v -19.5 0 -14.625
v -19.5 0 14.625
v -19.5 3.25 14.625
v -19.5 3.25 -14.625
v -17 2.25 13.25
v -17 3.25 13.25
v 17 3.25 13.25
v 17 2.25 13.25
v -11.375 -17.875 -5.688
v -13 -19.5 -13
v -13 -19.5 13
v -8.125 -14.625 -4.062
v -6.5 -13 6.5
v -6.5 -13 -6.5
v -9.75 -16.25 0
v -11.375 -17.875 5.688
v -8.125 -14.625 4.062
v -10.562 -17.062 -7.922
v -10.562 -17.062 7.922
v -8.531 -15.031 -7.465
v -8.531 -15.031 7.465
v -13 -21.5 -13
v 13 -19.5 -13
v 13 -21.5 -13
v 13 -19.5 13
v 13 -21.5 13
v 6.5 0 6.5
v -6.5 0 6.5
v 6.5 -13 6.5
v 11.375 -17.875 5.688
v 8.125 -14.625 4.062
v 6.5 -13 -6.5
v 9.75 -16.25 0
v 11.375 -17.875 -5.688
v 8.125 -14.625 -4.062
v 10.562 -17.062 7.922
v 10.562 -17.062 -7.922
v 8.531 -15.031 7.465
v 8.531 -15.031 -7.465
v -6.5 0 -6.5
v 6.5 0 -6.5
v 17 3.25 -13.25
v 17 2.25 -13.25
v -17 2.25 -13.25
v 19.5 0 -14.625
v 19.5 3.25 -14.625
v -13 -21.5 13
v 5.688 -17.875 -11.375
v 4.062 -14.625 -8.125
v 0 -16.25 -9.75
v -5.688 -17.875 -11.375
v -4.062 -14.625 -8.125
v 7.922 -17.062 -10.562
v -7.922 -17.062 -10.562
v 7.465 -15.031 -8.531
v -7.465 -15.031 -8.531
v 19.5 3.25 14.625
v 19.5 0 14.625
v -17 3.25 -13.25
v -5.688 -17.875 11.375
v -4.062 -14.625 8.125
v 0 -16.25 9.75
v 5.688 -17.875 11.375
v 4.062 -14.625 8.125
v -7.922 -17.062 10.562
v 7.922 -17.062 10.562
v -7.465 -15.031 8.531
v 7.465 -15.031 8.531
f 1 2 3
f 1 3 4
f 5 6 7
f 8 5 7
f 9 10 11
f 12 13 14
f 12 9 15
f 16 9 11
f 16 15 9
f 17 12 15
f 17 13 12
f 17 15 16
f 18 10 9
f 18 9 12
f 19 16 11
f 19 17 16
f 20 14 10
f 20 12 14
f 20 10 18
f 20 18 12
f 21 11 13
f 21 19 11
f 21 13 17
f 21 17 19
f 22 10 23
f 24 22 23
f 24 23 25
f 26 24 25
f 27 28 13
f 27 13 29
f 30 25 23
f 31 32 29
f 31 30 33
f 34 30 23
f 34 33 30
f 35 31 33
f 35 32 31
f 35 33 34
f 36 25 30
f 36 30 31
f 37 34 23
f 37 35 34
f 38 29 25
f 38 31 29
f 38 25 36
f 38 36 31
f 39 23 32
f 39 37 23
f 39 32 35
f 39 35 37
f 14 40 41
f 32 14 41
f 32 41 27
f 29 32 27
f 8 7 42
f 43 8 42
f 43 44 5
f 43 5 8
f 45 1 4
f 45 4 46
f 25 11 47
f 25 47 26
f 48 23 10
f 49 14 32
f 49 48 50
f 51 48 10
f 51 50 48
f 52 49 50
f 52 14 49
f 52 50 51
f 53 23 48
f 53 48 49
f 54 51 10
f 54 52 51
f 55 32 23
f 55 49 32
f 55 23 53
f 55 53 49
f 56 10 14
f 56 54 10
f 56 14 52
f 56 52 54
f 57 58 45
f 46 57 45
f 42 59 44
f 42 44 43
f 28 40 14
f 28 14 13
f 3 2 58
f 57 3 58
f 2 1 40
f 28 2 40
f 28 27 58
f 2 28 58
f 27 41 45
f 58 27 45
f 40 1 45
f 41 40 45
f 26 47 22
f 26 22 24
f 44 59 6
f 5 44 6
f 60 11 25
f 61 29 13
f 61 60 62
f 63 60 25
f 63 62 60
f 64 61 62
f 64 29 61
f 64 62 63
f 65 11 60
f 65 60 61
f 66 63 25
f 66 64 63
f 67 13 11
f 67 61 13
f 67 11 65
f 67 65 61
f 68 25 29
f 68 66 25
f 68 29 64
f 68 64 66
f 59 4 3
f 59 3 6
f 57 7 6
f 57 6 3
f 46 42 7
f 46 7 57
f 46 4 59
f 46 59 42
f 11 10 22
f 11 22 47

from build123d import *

# Parameters (mm, degrees)
SKETCH1_W           = 39
SKETCH1_H           = 29.25
BOSS_EXTRUDE1_DEPTH = 3.25
SKETCH3_W           = 13
SKETCH3_H           = 13
BOSS_EXTRUDE3_DEPTH = 13
SKETCH5_W           = 34
SKETCH5_H           = 24
CUT_EXTRUDE1_DEPTH  = 1
SKETCH6_W           = 26
SKETCH6_H           = 26
BOSS_EXTRUDE4_DEPTH = 2
SKETCH8_W           = 34
SKETCH8_H           = 1.25
CUT_EXTRUDE2_DEPTH  = 1


with BuildPart() as part:
    # Sketch1 → Boss-Extrude1 (new body)
    with BuildSketch(Plane(origin=(0, 0, 0), x_dir=(1, 0, 0), z_dir=(0, 1, 0))):
        Rectangle(SKETCH1_W, SKETCH1_H)
    extrude(amount=BOSS_EXTRUDE1_DEPTH)

    # Sketch3 → Boss-Extrude3 (add)
    with BuildSketch(Plane.XZ):
        Rectangle(SKETCH3_W, SKETCH3_H)
    extrude(amount=BOSS_EXTRUDE3_DEPTH)

    # Sketch4 → section 0 of loft1
    with BuildSketch(Plane(origin=(0, -19.5, 0), x_dir=(-1, 0, 0), z_dir=(0, -1, 0)), mode=Mode.PRIVATE) as loft1_s0:
        with BuildLine():
            Line((-13, 13), (13, 13))
            Line((13, 13), (13, -13))
            Line((13, -13), (-13, -13))
            Line((-13, -13), (-13, 13))
        make_face()
    # loft up to a face of the part (loft1)
    loft([loft1_s0.sketch, part.faces().sort_by_distance((0, -13, 0))[0]])

    # Sketch5 → Cut-Extrude1 (cut)
    with BuildSketch(Plane(origin=(0, 3.25, 0), x_dir=(1, 0, 0), z_dir=(0, 1, 0))):
        Rectangle(SKETCH5_W, SKETCH5_H)
    extrude(amount=-CUT_EXTRUDE1_DEPTH, mode=Mode.SUBTRACT)

    # Sketch6 → Boss-Extrude4 (add)
    with BuildSketch(Plane.XZ.offset(19.5)):
        Rectangle(SKETCH6_W, SKETCH6_H)
    extrude(amount=BOSS_EXTRUDE4_DEPTH)

    # Sketch8 → Cut-Extrude2 (cut)
    with BuildSketch(Plane(origin=(0, 3.25, 0), x_dir=(1, 0, 0), z_dir=(0, 1, 0))):
        with Locations((0, -12.625)):
            Rectangle(SKETCH8_W, SKETCH8_H)
    cut_extrude2 = extrude(amount=-CUT_EXTRUDE2_DEPTH, mode=Mode.SUBTRACT)

    # Mirror1: Cut-Extrude2 across plane
    add(cut_extrude2.mirror(Plane.XY), mode=Mode.SUBTRACT)


solid = part.part
